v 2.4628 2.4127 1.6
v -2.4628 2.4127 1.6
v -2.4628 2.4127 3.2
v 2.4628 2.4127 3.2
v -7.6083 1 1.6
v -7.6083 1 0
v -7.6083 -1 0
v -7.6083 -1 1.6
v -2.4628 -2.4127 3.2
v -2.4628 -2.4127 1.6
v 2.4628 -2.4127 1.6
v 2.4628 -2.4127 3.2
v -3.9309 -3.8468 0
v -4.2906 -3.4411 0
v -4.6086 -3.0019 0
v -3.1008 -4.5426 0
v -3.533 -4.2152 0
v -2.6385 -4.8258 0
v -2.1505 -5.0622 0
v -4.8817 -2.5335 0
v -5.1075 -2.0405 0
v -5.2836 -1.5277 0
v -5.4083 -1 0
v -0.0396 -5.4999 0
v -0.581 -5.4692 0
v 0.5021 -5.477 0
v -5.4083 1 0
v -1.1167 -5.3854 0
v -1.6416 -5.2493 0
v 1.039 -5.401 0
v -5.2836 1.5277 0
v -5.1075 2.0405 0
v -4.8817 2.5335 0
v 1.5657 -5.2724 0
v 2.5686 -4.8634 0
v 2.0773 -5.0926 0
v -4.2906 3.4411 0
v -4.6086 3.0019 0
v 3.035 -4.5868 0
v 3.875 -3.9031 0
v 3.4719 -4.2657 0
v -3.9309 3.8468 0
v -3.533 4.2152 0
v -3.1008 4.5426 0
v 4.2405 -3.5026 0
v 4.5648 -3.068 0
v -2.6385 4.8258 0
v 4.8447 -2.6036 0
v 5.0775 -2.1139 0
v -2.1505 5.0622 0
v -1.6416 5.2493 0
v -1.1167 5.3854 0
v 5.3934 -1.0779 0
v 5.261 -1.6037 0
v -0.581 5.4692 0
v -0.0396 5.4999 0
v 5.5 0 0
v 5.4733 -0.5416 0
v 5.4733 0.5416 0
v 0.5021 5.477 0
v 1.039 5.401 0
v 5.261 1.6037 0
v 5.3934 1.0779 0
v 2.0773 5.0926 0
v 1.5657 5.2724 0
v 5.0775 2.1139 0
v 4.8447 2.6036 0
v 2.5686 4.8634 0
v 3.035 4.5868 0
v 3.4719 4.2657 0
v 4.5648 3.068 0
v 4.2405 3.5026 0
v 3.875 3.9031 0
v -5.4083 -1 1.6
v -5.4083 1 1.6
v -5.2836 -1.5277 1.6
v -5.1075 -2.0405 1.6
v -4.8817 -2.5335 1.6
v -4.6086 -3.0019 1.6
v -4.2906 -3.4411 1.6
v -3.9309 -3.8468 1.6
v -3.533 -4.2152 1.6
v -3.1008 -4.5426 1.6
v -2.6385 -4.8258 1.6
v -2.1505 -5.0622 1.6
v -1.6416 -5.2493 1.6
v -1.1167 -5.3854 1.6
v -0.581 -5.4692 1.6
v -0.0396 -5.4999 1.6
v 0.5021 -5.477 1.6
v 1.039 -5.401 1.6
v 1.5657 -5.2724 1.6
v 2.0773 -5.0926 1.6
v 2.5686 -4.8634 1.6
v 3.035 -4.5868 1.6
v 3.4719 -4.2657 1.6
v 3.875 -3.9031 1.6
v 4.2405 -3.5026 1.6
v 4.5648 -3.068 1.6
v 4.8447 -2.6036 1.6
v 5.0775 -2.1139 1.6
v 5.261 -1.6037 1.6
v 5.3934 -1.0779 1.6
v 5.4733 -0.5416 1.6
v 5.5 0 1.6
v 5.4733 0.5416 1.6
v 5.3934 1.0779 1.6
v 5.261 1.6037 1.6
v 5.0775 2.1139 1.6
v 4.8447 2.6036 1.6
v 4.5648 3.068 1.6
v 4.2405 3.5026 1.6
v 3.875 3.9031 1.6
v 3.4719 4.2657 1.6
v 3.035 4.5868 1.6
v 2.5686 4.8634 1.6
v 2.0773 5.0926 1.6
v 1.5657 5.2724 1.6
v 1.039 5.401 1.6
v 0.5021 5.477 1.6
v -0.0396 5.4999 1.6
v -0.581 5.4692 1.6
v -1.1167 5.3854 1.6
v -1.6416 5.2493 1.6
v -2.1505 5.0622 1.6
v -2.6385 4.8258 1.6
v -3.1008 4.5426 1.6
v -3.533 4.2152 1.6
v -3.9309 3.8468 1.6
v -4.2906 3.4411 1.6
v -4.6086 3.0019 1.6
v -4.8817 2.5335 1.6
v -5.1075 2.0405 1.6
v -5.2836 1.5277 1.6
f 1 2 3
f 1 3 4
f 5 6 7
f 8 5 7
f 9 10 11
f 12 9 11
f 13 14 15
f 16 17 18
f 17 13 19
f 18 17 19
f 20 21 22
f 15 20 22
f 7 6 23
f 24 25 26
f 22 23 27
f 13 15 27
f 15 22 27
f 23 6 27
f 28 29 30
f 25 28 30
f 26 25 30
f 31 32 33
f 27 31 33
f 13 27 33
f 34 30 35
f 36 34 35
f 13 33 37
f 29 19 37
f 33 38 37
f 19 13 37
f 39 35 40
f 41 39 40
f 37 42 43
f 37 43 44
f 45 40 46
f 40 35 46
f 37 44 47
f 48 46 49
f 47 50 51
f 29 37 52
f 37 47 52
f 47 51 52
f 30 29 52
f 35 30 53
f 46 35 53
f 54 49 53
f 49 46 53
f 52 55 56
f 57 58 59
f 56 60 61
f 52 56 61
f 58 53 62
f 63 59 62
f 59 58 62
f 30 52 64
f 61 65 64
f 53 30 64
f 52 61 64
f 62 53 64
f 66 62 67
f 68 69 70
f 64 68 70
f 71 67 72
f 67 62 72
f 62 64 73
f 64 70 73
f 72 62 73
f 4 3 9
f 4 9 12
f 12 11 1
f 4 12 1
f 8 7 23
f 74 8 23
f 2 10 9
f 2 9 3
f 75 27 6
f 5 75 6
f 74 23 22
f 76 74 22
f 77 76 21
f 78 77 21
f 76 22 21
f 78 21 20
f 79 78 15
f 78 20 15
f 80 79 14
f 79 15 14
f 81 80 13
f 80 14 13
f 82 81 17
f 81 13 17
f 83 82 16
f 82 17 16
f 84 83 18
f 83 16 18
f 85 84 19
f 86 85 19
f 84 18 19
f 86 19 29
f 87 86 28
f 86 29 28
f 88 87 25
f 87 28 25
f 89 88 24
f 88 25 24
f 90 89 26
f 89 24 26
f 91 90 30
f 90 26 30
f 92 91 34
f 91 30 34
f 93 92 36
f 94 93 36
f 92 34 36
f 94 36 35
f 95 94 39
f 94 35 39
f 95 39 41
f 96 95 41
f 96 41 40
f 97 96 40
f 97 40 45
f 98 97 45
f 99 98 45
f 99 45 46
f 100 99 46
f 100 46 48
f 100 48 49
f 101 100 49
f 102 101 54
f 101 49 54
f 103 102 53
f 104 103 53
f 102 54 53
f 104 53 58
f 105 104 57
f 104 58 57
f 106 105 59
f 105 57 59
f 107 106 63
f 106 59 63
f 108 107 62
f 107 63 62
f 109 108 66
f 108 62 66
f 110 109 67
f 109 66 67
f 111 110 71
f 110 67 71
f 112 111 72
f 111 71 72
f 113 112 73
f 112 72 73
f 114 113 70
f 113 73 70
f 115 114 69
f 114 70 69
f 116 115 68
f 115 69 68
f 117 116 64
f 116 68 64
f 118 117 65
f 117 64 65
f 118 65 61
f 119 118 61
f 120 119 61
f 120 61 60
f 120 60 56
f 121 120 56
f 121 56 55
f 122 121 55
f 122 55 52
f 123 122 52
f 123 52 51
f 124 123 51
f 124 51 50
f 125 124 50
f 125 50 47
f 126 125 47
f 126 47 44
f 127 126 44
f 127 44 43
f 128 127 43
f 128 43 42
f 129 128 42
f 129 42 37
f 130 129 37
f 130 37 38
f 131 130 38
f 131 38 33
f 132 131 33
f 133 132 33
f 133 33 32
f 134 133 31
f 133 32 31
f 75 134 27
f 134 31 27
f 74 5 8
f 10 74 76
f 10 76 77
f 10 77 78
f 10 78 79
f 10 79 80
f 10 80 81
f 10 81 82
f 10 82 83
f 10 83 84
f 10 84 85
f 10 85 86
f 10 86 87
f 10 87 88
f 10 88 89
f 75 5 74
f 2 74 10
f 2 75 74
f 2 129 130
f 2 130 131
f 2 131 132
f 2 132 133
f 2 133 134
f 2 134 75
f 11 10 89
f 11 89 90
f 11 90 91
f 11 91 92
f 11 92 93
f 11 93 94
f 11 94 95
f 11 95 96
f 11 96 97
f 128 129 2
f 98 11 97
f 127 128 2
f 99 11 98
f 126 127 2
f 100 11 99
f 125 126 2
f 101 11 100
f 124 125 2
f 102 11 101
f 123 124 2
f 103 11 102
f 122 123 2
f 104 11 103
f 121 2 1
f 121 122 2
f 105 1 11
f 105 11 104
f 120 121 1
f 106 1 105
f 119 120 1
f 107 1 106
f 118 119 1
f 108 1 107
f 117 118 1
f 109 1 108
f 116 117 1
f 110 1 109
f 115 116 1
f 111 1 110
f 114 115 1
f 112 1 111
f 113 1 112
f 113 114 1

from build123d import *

# Parameters (mm, degrees)
EXTRUDE_1_DEPTH = 1.6
SKETCH_2_W      = 4.925580802
SKETCH_2_H      = 4.825372048
EXTRUDE_2_DEPTH = 1.6


with BuildPart() as part:
    # 草图1 → 凸台-拉伸1 (new body)
    with BuildSketch(Plane.XY):
        with BuildLine():
            Line((-5.408326913, 1), (-7.608326913, 1))
            Line((-7.608326913, 1), (-7.608326913, -1))
            Line((-7.608326913, -1), (-5.408326913, -1))
            ThreePointArc((-5.408326913, -1), (5.5, 0), (-5.408326913, 1))
        make_face()
    extrude(amount=EXTRUDE_1_DEPTH)

    # 草图2 → 凸台-拉伸2 (add)
    with BuildSketch(Plane.XY.offset(1.6)):
        Rectangle(SKETCH_2_W, SKETCH_2_H)
    extrude(amount=EXTRUDE_2_DEPTH)


solid = part.part
